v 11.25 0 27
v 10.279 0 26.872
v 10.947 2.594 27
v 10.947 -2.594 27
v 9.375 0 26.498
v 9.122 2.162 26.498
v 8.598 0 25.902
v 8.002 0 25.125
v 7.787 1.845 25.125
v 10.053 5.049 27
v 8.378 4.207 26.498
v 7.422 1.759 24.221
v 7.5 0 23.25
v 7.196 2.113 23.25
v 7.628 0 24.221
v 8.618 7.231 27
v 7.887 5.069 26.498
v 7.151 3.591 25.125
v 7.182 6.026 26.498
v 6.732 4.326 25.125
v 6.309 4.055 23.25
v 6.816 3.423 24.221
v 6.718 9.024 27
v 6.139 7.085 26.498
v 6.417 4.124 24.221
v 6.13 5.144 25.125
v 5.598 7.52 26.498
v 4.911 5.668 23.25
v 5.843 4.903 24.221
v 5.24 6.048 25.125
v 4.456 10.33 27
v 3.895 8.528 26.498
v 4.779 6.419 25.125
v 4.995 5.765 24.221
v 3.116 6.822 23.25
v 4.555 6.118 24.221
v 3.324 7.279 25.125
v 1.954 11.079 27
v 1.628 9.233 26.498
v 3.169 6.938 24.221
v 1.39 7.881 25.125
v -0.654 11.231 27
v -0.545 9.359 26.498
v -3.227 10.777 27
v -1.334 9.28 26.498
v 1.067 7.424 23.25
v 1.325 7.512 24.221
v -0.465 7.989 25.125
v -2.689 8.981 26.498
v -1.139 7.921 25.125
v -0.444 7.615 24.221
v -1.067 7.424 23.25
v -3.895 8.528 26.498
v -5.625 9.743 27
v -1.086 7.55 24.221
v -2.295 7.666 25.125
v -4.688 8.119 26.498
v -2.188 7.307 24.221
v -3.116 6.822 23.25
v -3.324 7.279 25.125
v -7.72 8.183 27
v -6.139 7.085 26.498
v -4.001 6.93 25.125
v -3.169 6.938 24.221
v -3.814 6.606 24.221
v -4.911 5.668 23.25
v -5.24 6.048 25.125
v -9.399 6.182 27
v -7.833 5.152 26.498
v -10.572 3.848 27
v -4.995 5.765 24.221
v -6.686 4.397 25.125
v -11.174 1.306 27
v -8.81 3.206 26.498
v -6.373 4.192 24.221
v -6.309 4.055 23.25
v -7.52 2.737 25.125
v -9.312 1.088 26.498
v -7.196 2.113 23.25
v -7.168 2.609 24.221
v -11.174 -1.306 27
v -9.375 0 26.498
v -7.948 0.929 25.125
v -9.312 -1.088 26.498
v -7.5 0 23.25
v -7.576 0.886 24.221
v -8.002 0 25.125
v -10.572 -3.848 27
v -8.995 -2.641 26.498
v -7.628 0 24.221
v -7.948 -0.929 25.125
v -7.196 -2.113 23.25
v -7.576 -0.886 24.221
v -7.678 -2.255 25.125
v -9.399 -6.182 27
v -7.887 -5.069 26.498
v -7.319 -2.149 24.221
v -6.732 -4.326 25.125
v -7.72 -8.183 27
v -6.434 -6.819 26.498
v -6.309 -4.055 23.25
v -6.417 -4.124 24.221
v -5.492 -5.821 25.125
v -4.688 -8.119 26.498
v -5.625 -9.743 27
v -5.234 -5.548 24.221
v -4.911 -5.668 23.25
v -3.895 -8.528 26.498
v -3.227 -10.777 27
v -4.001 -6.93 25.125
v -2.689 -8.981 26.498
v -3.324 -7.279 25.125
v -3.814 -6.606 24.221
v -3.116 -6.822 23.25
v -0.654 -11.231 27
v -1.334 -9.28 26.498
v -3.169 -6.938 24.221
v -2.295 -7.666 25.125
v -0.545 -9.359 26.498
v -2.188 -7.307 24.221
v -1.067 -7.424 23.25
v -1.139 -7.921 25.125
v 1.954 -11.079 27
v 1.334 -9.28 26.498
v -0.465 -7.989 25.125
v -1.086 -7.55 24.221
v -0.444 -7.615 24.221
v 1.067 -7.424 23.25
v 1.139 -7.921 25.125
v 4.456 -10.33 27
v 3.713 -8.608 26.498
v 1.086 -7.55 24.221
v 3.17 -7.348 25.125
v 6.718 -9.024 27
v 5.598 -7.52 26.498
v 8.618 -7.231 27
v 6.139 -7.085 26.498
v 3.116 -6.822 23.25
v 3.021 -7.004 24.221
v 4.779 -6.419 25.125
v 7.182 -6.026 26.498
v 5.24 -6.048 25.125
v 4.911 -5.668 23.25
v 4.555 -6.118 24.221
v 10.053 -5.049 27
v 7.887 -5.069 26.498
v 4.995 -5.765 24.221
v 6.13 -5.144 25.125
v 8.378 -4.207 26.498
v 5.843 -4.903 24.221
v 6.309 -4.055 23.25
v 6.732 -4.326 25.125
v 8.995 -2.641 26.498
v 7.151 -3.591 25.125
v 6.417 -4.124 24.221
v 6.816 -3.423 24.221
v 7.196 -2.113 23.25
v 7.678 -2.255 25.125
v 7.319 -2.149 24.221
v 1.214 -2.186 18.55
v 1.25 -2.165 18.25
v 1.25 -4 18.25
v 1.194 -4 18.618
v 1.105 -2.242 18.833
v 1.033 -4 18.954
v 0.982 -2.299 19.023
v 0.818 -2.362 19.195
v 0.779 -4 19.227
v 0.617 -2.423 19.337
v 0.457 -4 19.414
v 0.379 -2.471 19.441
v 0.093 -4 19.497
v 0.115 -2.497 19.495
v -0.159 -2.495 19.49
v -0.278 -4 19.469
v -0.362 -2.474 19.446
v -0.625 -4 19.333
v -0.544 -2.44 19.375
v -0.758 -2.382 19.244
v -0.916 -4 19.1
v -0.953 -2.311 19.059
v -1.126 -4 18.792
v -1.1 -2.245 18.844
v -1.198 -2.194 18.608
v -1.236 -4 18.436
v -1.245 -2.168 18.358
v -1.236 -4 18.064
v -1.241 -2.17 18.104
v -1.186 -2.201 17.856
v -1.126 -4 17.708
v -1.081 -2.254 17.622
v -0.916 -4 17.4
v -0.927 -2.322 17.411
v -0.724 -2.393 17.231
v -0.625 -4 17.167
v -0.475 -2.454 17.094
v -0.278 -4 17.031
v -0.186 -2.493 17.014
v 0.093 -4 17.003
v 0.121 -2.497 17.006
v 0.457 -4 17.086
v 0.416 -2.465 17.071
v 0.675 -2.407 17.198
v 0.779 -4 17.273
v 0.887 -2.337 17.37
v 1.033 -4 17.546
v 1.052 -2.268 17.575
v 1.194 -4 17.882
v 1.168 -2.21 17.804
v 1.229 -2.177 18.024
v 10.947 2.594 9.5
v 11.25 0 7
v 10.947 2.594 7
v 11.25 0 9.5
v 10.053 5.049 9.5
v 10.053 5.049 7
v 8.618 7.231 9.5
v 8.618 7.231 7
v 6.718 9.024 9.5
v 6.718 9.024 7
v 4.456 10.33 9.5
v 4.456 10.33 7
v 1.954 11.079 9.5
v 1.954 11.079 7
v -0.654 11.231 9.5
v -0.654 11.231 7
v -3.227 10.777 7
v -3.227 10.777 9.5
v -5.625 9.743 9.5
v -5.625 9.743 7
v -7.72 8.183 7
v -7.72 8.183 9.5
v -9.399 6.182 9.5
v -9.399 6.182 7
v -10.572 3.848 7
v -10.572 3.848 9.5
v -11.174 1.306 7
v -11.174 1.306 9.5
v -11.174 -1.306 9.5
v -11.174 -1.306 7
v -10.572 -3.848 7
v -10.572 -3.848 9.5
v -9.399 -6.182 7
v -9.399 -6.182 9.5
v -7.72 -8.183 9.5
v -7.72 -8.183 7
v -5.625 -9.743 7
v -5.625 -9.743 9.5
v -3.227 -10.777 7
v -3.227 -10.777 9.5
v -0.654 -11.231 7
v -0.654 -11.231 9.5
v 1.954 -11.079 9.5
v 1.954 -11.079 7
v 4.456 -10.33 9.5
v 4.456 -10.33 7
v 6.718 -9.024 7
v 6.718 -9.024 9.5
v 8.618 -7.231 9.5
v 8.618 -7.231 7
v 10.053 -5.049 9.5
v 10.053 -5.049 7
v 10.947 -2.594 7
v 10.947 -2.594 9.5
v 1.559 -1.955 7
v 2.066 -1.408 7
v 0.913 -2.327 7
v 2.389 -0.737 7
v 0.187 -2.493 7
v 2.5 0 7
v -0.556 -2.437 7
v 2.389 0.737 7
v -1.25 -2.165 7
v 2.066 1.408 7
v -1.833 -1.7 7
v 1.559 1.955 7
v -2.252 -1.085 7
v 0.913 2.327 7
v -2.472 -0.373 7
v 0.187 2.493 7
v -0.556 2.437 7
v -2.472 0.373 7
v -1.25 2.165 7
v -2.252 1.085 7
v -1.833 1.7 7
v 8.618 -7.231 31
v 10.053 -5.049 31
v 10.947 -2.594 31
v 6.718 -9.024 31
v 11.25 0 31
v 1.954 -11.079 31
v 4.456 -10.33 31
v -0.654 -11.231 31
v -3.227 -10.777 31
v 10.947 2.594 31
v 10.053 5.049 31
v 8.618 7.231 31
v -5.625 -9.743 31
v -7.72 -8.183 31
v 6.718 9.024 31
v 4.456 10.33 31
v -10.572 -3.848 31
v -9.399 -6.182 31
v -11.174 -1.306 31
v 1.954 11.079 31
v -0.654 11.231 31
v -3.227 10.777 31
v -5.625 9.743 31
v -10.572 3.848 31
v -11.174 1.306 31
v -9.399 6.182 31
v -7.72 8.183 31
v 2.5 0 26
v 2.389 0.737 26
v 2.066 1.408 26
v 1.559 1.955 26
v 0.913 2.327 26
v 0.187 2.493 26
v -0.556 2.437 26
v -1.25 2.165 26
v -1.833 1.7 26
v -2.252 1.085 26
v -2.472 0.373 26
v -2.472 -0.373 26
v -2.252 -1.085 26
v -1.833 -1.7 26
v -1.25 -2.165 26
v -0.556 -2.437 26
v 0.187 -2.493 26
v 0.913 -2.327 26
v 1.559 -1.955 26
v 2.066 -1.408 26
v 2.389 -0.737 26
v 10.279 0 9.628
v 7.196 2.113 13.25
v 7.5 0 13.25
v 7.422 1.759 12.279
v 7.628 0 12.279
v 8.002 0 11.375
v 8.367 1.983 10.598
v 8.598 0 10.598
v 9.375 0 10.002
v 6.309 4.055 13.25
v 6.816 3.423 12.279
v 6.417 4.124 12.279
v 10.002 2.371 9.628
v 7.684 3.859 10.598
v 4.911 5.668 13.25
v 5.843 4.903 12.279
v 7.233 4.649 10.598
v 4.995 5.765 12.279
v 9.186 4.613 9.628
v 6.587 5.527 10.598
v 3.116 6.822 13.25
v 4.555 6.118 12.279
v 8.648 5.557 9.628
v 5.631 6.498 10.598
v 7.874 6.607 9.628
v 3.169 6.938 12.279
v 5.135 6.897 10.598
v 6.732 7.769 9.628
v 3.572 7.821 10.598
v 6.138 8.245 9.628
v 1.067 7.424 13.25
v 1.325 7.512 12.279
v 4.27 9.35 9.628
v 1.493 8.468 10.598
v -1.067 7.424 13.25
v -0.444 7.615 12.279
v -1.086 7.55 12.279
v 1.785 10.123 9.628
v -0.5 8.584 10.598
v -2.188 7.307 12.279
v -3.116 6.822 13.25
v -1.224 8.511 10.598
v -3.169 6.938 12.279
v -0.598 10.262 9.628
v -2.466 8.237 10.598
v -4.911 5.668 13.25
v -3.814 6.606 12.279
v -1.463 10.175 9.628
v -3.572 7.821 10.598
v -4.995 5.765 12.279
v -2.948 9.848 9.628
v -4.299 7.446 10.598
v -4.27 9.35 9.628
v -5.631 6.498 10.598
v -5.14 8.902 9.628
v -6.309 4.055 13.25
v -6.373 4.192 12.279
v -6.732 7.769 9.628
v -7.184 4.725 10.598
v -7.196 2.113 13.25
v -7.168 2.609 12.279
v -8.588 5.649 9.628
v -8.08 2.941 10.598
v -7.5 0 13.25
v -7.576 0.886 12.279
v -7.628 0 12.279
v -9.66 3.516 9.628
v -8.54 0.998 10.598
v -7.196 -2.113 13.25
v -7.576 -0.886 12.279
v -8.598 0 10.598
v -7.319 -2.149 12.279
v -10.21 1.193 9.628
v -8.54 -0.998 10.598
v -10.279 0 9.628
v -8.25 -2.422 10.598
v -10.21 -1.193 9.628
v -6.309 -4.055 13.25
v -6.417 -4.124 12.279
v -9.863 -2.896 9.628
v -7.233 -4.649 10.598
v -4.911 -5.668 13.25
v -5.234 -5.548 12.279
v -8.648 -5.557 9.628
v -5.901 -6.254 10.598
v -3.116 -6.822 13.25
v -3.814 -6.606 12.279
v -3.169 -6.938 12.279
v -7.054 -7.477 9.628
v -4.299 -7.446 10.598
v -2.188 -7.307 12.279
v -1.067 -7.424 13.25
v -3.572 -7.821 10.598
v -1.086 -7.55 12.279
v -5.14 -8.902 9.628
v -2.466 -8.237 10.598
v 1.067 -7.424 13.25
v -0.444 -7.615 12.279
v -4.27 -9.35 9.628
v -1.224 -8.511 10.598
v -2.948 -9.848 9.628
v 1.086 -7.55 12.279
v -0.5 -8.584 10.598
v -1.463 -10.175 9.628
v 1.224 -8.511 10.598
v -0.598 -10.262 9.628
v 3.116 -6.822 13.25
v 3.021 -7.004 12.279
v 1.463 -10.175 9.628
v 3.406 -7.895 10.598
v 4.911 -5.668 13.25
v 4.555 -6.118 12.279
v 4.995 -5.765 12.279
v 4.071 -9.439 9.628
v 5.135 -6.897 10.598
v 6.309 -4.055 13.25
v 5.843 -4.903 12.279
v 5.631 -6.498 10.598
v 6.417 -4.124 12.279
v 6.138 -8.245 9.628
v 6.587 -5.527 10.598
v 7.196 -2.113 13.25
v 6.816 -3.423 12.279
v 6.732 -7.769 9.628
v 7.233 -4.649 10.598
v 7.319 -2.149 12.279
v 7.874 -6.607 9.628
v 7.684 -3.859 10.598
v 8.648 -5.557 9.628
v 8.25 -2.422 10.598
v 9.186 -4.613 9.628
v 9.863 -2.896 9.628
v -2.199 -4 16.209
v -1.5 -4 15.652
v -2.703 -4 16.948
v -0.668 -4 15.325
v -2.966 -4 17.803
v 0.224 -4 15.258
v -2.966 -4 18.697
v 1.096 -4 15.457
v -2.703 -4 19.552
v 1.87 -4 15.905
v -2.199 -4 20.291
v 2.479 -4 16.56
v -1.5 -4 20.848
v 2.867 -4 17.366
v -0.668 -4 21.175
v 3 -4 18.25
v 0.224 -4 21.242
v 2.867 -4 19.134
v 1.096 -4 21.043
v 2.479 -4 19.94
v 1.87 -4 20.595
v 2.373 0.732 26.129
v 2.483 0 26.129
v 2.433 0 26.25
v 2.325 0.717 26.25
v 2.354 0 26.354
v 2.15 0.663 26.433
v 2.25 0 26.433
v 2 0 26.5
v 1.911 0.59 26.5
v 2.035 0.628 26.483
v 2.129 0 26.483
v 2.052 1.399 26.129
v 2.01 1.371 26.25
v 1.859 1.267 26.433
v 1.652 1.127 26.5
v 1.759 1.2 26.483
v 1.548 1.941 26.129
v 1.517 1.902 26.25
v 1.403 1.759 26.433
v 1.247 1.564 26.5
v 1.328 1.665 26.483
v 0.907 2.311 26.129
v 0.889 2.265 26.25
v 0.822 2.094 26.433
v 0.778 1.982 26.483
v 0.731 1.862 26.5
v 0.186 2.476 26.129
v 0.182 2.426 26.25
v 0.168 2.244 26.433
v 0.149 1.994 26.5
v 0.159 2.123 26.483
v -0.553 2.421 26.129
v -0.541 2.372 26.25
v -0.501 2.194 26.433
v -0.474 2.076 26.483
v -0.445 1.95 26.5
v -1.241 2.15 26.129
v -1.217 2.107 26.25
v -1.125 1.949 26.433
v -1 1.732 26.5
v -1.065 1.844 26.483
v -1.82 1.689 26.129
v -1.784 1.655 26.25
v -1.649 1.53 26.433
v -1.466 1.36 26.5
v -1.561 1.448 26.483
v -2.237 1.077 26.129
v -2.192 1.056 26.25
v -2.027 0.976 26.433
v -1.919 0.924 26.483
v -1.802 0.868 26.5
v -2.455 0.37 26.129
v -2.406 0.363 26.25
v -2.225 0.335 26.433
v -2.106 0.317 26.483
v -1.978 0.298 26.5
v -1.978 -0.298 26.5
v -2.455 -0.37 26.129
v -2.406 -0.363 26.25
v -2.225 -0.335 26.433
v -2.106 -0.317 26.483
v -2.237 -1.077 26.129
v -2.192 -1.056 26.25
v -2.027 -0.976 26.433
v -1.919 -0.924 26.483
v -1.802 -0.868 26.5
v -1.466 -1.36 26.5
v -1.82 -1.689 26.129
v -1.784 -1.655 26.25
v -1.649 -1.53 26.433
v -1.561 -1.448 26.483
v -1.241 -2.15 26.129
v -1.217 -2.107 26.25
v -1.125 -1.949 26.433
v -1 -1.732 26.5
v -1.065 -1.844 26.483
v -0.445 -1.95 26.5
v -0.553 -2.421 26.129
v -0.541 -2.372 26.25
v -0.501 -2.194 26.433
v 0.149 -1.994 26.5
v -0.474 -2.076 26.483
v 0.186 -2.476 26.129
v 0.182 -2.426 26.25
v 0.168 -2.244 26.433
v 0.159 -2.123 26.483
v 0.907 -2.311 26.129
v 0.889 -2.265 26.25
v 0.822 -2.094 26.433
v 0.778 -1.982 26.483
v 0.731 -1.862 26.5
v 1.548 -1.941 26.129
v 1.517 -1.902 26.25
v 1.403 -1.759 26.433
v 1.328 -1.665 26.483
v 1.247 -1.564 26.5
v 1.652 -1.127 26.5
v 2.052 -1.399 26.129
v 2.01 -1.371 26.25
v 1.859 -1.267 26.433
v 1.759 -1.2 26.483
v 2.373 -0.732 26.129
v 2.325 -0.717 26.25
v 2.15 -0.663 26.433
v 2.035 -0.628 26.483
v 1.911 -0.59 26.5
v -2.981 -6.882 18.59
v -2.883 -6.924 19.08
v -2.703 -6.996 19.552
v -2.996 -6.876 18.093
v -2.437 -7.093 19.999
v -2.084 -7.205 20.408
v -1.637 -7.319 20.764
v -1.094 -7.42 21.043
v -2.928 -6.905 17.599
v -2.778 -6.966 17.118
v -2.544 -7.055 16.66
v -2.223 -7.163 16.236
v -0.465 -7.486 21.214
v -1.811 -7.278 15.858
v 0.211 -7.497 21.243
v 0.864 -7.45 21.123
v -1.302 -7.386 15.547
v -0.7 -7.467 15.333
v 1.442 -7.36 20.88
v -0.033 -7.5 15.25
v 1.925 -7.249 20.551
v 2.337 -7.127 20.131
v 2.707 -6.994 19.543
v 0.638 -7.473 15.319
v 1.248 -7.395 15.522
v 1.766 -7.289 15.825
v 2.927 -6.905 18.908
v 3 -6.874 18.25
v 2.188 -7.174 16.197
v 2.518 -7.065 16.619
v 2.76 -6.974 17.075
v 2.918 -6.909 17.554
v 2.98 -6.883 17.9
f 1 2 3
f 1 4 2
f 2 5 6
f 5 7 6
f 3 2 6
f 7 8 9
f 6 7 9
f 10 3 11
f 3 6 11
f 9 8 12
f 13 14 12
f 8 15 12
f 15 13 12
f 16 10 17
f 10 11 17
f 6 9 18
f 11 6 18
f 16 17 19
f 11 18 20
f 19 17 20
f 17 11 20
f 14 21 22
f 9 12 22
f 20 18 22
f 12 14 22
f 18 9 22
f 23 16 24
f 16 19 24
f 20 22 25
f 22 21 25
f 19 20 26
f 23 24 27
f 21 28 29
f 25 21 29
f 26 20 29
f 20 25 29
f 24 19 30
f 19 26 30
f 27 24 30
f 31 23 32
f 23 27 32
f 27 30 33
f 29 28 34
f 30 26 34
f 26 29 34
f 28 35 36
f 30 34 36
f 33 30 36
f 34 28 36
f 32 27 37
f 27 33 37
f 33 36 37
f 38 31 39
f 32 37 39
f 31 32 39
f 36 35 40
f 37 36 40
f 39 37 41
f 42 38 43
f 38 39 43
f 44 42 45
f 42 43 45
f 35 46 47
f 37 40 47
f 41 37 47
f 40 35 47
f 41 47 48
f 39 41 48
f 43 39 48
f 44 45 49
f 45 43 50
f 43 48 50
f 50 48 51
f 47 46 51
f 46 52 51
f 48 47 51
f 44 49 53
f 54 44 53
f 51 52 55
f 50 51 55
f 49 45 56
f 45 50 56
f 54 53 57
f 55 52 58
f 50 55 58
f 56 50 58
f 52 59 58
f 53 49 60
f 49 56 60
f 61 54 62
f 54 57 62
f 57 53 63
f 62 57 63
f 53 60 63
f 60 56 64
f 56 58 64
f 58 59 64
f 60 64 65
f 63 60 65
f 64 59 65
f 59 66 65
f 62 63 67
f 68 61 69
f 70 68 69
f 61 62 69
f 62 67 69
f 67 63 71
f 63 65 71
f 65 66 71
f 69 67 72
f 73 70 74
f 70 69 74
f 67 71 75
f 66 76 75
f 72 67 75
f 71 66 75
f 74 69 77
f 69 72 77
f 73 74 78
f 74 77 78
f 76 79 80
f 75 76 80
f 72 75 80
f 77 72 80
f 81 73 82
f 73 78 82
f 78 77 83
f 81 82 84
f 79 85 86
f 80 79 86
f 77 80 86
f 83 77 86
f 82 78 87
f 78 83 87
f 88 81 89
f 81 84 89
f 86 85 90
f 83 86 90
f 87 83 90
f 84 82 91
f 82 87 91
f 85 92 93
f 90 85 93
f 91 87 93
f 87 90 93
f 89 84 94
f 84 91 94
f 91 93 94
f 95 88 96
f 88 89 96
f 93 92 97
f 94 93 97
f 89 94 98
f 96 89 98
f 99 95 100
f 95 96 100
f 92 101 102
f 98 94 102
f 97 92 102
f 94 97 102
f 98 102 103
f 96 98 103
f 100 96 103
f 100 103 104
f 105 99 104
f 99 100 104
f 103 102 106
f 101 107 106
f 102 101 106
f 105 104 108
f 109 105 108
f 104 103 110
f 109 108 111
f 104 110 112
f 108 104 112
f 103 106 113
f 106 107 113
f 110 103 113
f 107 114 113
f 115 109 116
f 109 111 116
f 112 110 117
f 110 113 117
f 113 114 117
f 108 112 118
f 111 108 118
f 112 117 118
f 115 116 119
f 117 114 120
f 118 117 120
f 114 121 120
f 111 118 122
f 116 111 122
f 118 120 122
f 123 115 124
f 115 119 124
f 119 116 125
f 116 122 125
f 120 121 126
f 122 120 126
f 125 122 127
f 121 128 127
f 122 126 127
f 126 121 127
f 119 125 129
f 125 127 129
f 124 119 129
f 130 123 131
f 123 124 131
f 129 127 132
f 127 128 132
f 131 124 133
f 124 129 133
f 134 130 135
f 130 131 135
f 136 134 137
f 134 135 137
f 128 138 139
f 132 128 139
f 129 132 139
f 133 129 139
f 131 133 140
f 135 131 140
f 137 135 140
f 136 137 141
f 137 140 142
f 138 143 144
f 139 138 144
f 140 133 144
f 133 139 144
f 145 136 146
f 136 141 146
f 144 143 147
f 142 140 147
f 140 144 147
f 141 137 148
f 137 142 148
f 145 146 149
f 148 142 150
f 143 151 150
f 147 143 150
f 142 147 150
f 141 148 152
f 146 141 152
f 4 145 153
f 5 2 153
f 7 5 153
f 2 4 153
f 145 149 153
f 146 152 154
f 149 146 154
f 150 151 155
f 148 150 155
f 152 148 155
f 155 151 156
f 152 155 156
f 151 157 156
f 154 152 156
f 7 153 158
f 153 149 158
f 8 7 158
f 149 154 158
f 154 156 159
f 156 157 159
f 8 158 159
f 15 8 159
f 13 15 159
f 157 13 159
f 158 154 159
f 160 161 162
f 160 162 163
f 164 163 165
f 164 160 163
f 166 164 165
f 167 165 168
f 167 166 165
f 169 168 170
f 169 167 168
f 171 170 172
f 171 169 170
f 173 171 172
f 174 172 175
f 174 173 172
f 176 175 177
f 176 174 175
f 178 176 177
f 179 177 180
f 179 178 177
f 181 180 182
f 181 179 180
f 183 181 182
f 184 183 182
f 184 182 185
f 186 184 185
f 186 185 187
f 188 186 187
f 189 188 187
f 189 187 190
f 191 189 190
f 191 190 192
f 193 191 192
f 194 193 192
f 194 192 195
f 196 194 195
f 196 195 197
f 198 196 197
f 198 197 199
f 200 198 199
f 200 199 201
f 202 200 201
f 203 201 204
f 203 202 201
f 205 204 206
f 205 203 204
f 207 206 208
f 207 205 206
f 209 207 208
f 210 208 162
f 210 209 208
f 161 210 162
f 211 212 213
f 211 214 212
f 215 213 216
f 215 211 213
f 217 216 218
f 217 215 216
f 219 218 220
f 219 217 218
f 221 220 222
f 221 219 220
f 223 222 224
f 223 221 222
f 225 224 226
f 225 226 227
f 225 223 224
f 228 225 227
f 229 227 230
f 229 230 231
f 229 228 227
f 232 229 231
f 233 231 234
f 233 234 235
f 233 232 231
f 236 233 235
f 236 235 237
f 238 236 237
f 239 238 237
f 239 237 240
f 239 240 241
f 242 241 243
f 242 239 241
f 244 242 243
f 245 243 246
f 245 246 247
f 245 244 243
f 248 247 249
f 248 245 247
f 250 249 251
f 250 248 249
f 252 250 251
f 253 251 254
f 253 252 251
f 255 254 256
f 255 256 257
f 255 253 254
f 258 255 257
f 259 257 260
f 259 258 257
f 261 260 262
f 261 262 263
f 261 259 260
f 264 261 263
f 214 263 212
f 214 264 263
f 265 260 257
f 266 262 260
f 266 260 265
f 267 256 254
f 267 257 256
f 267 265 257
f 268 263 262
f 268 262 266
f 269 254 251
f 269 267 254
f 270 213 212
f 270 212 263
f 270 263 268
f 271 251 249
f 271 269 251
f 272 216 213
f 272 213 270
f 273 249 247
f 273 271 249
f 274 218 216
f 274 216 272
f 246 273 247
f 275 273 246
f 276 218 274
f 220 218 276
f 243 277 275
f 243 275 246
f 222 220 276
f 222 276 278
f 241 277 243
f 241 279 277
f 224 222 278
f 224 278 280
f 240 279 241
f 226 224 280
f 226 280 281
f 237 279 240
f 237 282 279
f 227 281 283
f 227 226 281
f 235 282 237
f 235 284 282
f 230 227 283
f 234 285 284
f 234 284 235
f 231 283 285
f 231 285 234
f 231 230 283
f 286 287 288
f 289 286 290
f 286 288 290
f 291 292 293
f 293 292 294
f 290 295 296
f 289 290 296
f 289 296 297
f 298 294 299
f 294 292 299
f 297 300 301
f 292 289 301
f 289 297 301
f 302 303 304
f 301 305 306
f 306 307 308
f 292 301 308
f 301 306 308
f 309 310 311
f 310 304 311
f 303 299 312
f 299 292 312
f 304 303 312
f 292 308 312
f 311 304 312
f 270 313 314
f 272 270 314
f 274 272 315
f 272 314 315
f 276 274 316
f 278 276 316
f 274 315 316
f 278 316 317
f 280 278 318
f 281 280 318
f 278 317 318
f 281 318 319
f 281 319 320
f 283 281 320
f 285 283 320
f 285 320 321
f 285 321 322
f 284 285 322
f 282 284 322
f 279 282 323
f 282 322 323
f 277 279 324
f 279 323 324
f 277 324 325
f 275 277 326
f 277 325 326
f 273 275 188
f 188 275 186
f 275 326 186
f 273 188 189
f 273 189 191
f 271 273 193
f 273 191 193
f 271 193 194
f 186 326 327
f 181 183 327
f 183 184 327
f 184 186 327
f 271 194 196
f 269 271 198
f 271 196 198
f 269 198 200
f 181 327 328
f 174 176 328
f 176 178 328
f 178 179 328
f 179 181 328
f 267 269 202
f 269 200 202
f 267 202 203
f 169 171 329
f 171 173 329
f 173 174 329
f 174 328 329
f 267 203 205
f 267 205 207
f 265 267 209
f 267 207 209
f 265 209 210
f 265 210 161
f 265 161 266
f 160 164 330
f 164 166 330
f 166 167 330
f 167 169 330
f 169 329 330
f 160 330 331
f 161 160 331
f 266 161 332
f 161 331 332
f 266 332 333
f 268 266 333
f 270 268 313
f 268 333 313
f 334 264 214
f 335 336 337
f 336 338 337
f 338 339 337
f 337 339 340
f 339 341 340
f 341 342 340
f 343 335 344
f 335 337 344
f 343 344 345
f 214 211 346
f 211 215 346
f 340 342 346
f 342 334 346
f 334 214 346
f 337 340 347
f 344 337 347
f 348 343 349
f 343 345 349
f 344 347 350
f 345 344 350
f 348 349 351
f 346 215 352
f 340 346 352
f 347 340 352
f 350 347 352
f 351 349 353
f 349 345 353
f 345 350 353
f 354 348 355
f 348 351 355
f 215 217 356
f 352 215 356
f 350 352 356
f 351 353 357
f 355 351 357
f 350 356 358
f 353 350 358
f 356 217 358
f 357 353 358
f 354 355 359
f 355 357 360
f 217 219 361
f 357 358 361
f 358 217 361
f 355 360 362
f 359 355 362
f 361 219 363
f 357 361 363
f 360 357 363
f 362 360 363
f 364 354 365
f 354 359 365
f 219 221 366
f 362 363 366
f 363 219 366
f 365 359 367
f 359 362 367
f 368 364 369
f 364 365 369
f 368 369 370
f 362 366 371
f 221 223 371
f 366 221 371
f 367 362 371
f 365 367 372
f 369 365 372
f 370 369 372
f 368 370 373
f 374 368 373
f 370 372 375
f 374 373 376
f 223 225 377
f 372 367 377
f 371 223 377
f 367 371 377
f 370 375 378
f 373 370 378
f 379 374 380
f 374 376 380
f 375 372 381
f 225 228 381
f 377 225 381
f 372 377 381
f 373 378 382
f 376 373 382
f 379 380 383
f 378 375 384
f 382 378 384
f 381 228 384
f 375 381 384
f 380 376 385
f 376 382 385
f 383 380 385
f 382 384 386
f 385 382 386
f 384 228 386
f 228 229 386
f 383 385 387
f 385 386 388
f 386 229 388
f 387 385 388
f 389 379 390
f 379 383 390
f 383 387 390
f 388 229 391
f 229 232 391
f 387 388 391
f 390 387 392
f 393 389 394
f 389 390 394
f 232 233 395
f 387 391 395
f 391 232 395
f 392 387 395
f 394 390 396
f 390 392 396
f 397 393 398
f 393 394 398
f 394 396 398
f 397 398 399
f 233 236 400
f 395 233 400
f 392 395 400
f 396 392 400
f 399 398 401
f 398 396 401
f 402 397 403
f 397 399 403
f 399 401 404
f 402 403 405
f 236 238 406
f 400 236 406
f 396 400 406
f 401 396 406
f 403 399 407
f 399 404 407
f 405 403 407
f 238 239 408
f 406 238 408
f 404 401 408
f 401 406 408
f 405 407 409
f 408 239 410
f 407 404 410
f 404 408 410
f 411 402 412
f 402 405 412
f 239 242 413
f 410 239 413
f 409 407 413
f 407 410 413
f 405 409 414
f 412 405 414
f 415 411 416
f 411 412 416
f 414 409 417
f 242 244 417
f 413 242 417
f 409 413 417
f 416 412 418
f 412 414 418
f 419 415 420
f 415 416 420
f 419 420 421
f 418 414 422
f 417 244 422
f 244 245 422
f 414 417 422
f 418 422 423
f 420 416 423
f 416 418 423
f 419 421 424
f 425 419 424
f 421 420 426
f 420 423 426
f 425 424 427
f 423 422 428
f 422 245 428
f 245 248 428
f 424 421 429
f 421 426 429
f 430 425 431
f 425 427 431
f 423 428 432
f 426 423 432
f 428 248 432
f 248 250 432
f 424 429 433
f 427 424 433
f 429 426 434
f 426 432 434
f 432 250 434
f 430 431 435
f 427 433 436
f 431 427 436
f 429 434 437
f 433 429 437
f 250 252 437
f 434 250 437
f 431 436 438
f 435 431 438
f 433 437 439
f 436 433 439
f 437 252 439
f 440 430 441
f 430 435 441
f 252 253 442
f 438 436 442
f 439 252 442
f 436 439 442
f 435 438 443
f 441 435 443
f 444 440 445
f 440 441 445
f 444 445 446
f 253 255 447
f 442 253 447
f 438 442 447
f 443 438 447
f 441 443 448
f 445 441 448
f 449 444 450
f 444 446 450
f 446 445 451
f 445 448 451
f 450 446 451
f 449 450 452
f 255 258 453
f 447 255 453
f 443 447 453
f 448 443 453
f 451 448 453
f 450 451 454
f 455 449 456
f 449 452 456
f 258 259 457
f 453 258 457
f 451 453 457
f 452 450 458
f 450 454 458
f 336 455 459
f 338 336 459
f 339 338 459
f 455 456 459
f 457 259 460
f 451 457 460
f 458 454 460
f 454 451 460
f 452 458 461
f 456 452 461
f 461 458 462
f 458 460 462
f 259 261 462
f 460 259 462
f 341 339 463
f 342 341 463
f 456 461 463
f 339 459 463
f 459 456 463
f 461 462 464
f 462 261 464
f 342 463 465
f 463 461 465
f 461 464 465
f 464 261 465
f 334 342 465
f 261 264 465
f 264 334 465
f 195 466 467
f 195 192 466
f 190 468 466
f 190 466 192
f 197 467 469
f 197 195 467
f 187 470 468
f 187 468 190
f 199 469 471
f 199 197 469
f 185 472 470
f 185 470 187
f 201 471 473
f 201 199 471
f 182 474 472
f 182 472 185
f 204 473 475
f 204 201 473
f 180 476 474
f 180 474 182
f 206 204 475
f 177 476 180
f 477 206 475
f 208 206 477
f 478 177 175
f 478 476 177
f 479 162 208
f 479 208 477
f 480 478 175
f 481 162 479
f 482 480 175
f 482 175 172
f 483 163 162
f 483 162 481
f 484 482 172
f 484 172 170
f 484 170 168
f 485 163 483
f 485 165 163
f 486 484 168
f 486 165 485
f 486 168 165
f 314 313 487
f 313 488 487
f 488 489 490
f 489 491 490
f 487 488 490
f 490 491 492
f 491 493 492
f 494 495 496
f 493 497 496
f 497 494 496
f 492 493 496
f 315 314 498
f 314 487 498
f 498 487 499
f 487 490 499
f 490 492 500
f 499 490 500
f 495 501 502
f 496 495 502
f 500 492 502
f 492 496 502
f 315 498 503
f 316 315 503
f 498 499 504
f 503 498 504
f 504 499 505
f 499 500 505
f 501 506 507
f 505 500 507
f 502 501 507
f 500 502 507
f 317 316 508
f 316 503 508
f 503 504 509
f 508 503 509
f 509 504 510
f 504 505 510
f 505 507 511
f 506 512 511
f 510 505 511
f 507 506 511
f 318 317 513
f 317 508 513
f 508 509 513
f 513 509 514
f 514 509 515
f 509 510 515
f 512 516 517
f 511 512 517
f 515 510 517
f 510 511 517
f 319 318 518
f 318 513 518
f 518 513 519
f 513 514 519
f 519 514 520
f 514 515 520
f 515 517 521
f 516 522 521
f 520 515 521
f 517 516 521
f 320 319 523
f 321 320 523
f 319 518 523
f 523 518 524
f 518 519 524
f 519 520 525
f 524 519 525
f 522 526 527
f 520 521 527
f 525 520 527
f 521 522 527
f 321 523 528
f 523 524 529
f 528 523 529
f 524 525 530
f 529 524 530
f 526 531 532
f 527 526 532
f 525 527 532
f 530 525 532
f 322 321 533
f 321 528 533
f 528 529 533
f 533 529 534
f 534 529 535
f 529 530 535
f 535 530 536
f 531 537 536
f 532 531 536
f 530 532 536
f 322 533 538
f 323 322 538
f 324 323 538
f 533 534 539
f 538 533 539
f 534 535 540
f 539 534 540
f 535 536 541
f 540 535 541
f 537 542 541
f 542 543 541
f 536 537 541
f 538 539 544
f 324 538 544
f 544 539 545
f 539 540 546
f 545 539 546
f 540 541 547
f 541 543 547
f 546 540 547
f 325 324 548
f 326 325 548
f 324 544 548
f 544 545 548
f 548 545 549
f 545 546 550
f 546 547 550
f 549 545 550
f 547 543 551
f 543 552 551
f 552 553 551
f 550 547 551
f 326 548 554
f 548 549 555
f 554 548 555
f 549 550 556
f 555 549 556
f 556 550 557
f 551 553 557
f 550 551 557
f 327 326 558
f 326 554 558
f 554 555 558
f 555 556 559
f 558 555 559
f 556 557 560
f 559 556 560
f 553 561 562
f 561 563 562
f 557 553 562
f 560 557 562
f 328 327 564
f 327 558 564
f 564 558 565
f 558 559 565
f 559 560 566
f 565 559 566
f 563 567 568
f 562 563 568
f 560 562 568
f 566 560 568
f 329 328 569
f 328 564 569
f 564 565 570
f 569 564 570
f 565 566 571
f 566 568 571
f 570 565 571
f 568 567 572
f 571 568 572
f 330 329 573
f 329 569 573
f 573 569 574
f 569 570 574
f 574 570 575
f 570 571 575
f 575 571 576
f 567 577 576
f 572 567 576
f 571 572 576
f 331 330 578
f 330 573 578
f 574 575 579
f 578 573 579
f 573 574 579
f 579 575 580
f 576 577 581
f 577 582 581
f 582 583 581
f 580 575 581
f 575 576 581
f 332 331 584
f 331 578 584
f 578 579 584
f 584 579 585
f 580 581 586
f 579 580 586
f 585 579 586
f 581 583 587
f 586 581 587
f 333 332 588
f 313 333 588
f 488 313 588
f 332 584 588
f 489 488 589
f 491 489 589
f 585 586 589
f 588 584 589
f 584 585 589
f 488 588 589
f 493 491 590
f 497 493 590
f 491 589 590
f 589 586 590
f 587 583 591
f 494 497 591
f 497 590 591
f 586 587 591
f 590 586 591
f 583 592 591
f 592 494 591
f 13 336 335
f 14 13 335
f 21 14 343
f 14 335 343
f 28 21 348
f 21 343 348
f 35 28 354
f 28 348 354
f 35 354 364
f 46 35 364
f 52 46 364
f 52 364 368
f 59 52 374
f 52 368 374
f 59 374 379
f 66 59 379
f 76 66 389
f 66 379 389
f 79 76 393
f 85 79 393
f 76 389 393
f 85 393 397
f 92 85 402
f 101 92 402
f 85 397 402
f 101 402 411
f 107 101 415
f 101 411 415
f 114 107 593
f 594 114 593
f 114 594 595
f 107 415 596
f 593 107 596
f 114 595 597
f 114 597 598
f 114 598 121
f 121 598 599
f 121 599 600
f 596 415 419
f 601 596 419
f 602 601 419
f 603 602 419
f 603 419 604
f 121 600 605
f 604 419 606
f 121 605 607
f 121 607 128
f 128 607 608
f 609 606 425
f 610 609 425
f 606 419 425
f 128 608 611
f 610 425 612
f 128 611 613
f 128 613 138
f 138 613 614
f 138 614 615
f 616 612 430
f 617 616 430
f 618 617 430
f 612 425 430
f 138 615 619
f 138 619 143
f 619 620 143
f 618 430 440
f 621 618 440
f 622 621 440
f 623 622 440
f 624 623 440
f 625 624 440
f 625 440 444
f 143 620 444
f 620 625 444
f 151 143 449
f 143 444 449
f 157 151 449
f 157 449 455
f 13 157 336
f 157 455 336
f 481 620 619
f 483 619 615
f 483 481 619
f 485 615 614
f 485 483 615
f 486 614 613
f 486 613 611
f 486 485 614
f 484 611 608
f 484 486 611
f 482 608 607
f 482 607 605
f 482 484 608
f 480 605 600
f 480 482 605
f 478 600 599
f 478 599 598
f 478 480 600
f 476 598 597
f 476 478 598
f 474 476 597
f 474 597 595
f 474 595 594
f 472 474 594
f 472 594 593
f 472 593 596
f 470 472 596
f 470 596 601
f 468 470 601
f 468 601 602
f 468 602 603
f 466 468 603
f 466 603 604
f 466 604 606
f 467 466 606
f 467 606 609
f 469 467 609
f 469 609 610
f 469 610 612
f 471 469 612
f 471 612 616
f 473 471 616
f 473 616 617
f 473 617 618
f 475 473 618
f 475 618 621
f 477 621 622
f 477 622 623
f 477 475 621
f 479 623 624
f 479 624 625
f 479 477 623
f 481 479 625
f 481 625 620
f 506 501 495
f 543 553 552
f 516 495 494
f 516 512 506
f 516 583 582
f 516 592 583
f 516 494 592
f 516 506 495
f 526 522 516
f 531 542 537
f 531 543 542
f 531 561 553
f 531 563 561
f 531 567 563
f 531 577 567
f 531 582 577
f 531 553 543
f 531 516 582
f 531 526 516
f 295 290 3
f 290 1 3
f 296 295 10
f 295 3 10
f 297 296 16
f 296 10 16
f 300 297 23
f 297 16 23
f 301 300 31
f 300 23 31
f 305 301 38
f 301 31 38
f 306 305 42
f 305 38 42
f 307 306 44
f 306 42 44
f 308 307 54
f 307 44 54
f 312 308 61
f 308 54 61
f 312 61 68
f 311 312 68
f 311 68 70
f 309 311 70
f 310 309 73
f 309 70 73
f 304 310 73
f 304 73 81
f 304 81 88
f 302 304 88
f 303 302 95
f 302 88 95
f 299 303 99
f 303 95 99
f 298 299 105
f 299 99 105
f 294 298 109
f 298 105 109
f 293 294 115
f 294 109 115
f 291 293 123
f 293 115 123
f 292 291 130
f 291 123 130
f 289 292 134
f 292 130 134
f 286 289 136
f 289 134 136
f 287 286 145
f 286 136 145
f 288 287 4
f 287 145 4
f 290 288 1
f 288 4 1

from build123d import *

# Parameters (mm, degrees)
EXTRUDE001_START = 4
SKETCH002_R      = 3
EXTRUDE001_DEPTH = 3.5
SKETCH001_R      = 1.25
EXTRUDE_DEPTH    = 10


with BuildPart() as extrude001:
    # Sketch002 → Extrude001 (new body)
    with BuildSketch(Plane.XZ.offset(EXTRUDE001_START)):
        with Locations((0, 18.25)):
            Circle(SKETCH002_R)
    extrude(amount=EXTRUDE001_DEPTH)


with BuildPart() as fusion:
    # Sketch001 → Extrude (new body)
    with BuildSketch(Plane.XZ):
        with Locations((0, 18.25)):
            Circle(SKETCH001_R)
    extrude(amount=EXTRUDE_DEPTH)

    # Fusion: union Extrude001
    add(extrude001.part)


with BuildPart() as nya:
    # Sketch → Revolve (revolve)
    with BuildSketch(Plane.XZ):
        with BuildLine():
            Line((2.5, 7), (2.5, 26))
            ThreePointArc((2.5, 26), (2.353553, 26.353553), (2, 26.5))
            Line((0, 26.5), (2, 26.5))
            Line((0, 31), (0, 26.5))
            Line((0, 31), (11.25, 31))
            Line((11.25, 31), (11.25, 27))
            ThreePointArc((11.25, 27), (8.59835, 25.90165), (7.5, 23.25))
            Line((7.5, 23.25), (7.5, 13.25))
            ThreePointArc((7.5, 13.25), (8.59835, 10.59835), (11.25, 9.5))
            Line((11.25, 7), (11.25, 9.5))
            Line((2.5, 7), (11.25, 7))
        make_face()
    revolve(axis=Axis((0, 0, 0), (0, 0, 1)))

    # Cut: cut Fusion
    add(fusion.part, mode=Mode.SUBTRACT)


solid = nya.part
